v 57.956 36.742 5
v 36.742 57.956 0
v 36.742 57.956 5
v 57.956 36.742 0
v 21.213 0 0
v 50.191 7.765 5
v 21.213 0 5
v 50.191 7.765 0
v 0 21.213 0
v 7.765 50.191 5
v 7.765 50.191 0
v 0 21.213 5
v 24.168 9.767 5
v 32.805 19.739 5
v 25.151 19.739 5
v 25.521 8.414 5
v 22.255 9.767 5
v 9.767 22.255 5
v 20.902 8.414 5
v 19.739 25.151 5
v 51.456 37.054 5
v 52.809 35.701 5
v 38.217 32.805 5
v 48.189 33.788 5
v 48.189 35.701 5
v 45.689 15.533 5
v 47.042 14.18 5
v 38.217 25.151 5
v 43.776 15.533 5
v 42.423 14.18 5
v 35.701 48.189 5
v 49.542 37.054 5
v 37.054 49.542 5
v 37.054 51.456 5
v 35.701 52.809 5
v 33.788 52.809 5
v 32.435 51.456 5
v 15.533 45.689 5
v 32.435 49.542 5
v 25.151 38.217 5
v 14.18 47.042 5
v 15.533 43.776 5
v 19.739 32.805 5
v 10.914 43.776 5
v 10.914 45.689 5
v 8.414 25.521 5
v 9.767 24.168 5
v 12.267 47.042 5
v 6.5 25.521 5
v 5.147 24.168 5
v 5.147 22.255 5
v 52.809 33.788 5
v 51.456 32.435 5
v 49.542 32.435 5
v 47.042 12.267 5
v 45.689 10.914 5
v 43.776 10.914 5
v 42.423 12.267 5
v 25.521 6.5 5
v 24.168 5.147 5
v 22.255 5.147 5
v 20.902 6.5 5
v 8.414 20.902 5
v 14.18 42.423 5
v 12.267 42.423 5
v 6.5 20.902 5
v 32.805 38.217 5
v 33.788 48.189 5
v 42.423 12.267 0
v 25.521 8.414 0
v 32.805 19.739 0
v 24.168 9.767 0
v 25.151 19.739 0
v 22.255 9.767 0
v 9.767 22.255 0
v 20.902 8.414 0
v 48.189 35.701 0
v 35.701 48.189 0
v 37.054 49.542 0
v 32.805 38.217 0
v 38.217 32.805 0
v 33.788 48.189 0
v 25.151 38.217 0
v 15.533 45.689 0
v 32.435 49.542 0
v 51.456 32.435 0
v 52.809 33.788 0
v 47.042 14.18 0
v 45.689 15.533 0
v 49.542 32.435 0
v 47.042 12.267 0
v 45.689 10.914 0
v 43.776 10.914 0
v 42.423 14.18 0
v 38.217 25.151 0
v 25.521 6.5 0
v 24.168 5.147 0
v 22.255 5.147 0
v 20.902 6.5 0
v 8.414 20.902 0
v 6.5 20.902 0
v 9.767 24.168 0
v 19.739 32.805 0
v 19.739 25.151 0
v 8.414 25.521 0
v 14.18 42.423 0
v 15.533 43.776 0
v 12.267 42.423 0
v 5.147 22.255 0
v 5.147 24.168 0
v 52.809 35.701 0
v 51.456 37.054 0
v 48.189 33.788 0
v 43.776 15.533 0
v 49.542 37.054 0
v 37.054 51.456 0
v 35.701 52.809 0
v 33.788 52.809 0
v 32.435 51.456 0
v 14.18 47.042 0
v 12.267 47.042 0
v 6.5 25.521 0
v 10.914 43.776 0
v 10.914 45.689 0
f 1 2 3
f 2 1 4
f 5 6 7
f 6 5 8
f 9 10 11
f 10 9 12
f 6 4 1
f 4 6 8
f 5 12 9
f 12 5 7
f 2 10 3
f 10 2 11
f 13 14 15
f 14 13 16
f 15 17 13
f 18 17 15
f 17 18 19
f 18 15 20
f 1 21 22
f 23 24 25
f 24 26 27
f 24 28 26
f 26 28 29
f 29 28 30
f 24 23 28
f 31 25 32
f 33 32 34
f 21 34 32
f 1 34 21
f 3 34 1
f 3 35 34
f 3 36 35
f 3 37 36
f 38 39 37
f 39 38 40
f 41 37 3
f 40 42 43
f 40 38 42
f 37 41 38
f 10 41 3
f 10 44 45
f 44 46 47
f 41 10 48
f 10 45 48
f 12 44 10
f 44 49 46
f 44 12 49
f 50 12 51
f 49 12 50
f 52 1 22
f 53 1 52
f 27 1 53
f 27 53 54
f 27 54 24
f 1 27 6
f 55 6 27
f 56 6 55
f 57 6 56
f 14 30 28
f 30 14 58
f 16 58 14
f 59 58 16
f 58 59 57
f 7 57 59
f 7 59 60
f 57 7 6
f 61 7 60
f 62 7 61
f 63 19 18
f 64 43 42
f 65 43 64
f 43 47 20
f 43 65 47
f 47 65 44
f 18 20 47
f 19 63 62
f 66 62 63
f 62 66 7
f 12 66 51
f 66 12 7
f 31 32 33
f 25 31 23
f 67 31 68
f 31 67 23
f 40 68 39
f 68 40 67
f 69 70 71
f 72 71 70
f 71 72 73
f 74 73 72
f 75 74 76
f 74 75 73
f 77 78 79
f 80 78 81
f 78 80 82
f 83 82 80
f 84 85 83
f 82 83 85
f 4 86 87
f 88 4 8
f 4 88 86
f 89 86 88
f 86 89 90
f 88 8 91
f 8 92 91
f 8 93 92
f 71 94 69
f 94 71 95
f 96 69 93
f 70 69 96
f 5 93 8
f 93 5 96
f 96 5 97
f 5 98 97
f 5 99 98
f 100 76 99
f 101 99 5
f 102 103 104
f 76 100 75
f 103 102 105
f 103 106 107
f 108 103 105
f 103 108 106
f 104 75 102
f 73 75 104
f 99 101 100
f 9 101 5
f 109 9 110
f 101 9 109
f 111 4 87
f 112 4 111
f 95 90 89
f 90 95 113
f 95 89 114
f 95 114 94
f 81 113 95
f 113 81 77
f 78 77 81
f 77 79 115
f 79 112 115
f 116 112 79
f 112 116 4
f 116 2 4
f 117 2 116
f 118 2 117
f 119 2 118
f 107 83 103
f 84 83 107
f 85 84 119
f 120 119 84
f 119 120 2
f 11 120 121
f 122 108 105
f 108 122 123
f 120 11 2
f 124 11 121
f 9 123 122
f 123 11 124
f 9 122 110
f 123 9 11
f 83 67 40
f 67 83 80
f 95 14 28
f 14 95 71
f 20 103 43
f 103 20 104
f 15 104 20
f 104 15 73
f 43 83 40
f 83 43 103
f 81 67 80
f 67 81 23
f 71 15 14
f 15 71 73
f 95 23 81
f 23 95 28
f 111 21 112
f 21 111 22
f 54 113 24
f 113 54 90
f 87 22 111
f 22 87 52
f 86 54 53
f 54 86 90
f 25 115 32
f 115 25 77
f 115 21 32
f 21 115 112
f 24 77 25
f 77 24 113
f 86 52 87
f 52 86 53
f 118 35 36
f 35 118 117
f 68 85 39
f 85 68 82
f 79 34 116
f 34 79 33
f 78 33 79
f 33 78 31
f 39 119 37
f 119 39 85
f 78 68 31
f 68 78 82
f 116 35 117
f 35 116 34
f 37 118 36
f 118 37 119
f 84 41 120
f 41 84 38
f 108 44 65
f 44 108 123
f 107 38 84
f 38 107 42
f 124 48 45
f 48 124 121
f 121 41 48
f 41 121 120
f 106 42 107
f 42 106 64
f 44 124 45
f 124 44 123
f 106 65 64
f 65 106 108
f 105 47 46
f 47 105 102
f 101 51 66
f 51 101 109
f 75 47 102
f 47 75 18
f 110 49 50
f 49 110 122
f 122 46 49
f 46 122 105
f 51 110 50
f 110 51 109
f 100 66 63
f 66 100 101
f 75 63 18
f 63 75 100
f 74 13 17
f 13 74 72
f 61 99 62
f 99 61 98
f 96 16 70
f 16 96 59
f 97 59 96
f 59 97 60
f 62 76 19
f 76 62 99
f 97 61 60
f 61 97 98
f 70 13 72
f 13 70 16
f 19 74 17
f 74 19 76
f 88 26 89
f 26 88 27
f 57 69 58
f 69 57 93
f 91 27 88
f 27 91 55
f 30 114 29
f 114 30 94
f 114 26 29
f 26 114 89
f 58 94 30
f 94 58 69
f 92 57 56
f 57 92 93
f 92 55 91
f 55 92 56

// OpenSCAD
$fn = 32;
// target_bbox: 57.956, 57.956, 5
// ----------------------------------------------------------------------
// Polygon plate: 6-gon R30, 6 bolt windows
// ----------------------------------------------------------------------

// --- parameters (mm) ---
sides = 6;                // number of polygon sides
plate_r = 30;             // circumscribed radius of the polygon
bore_r = 10;              // centre bore radius
bolts = 6;                // number of bolt windows
ring_r = 22.28;           // bolt-circle radius
bolt_r = 2.5;             // bolt window radius
plate_t = 5;              // plate thickness, Z (extrusion height)

plate_d = 2 * plate_r;  // circumscribed diameter
bore_d = 2 * bore_r;  // centre bore diameter
bolt_d = 2 * bolt_r;  // bolt window diameter
ring_d = 2 * ring_r;  // bolt-circle diameter

profile = [[57.956, 36.742], [36.742, 57.956], [7.765, 50.191], [0, 21.213], [21.213, 0], [50.191, 7.765]];  // primary outline, 6 points, counter clockwise
void_1 = [[38.217, 32.805], [32.805, 38.217], [25.151, 38.217], [19.739, 32.805], [19.739, 25.151], [25.151, 19.739], [32.805, 19.739], [38.217, 25.151]];  // centre bore, 8 points
void_2 = [[52.809, 35.701], [51.456, 37.054], [49.542, 37.054], [48.189, 35.701], [48.189, 33.788], [49.542, 32.435], [51.456, 32.435], [52.809, 33.788]];  // bolt window 1, 8 points
void_3 = [[37.054, 51.456], [35.701, 52.809], [33.788, 52.809], [32.435, 51.456], [32.435, 49.542], [33.788, 48.189], [35.701, 48.189], [37.054, 49.542]];  // bolt window 2, 8 points
void_4 = [[15.533, 45.689], [14.18, 47.042], [12.267, 47.042], [10.914, 45.689], [10.914, 43.776], [12.267, 42.423], [14.18, 42.423], [15.533, 43.776]];  // bolt window 3, 8 points
void_5 = [[9.767, 24.168], [8.414, 25.521], [6.5, 25.521], [5.147, 24.168], [5.147, 22.255], [6.5, 20.902], [8.414, 20.902], [9.767, 22.255]];  // bolt window 4, 8 points
void_6 = [[25.521, 8.414], [24.168, 9.767], [22.255, 9.767], [20.902, 8.414], [20.902, 6.5], [22.255, 5.147], [24.168, 5.147], [25.521, 6.5]];  // bolt window 5, 8 points
void_7 = [[47.042, 14.18], [45.689, 15.533], [43.776, 15.533], [42.423, 14.18], [42.423, 12.267], [43.776, 10.914], [45.689, 10.914], [47.042, 12.267]];  // bolt window 6, 8 points

// --- the one profile operation ---
difference() {
  linear_extrude(height = plate_t) polygon(points = profile);
  translate([0, 0, -1])
    linear_extrude(height = plate_t + 2) polygon(points = void_1);
  translate([0, 0, -1])
    linear_extrude(height = plate_t + 2) polygon(points = void_2);
  translate([0, 0, -1])
    linear_extrude(height = plate_t + 2) polygon(points = void_3);
  translate([0, 0, -1])
    linear_extrude(height = plate_t + 2) polygon(points = void_4);
  translate([0, 0, -1])
    linear_extrude(height = plate_t + 2) polygon(points = void_5);
  translate([0, 0, -1])
    linear_extrude(height = plate_t + 2) polygon(points = void_6);
  translate([0, 0, -1])
    linear_extrude(height = plate_t + 2) polygon(points = void_7);
}
